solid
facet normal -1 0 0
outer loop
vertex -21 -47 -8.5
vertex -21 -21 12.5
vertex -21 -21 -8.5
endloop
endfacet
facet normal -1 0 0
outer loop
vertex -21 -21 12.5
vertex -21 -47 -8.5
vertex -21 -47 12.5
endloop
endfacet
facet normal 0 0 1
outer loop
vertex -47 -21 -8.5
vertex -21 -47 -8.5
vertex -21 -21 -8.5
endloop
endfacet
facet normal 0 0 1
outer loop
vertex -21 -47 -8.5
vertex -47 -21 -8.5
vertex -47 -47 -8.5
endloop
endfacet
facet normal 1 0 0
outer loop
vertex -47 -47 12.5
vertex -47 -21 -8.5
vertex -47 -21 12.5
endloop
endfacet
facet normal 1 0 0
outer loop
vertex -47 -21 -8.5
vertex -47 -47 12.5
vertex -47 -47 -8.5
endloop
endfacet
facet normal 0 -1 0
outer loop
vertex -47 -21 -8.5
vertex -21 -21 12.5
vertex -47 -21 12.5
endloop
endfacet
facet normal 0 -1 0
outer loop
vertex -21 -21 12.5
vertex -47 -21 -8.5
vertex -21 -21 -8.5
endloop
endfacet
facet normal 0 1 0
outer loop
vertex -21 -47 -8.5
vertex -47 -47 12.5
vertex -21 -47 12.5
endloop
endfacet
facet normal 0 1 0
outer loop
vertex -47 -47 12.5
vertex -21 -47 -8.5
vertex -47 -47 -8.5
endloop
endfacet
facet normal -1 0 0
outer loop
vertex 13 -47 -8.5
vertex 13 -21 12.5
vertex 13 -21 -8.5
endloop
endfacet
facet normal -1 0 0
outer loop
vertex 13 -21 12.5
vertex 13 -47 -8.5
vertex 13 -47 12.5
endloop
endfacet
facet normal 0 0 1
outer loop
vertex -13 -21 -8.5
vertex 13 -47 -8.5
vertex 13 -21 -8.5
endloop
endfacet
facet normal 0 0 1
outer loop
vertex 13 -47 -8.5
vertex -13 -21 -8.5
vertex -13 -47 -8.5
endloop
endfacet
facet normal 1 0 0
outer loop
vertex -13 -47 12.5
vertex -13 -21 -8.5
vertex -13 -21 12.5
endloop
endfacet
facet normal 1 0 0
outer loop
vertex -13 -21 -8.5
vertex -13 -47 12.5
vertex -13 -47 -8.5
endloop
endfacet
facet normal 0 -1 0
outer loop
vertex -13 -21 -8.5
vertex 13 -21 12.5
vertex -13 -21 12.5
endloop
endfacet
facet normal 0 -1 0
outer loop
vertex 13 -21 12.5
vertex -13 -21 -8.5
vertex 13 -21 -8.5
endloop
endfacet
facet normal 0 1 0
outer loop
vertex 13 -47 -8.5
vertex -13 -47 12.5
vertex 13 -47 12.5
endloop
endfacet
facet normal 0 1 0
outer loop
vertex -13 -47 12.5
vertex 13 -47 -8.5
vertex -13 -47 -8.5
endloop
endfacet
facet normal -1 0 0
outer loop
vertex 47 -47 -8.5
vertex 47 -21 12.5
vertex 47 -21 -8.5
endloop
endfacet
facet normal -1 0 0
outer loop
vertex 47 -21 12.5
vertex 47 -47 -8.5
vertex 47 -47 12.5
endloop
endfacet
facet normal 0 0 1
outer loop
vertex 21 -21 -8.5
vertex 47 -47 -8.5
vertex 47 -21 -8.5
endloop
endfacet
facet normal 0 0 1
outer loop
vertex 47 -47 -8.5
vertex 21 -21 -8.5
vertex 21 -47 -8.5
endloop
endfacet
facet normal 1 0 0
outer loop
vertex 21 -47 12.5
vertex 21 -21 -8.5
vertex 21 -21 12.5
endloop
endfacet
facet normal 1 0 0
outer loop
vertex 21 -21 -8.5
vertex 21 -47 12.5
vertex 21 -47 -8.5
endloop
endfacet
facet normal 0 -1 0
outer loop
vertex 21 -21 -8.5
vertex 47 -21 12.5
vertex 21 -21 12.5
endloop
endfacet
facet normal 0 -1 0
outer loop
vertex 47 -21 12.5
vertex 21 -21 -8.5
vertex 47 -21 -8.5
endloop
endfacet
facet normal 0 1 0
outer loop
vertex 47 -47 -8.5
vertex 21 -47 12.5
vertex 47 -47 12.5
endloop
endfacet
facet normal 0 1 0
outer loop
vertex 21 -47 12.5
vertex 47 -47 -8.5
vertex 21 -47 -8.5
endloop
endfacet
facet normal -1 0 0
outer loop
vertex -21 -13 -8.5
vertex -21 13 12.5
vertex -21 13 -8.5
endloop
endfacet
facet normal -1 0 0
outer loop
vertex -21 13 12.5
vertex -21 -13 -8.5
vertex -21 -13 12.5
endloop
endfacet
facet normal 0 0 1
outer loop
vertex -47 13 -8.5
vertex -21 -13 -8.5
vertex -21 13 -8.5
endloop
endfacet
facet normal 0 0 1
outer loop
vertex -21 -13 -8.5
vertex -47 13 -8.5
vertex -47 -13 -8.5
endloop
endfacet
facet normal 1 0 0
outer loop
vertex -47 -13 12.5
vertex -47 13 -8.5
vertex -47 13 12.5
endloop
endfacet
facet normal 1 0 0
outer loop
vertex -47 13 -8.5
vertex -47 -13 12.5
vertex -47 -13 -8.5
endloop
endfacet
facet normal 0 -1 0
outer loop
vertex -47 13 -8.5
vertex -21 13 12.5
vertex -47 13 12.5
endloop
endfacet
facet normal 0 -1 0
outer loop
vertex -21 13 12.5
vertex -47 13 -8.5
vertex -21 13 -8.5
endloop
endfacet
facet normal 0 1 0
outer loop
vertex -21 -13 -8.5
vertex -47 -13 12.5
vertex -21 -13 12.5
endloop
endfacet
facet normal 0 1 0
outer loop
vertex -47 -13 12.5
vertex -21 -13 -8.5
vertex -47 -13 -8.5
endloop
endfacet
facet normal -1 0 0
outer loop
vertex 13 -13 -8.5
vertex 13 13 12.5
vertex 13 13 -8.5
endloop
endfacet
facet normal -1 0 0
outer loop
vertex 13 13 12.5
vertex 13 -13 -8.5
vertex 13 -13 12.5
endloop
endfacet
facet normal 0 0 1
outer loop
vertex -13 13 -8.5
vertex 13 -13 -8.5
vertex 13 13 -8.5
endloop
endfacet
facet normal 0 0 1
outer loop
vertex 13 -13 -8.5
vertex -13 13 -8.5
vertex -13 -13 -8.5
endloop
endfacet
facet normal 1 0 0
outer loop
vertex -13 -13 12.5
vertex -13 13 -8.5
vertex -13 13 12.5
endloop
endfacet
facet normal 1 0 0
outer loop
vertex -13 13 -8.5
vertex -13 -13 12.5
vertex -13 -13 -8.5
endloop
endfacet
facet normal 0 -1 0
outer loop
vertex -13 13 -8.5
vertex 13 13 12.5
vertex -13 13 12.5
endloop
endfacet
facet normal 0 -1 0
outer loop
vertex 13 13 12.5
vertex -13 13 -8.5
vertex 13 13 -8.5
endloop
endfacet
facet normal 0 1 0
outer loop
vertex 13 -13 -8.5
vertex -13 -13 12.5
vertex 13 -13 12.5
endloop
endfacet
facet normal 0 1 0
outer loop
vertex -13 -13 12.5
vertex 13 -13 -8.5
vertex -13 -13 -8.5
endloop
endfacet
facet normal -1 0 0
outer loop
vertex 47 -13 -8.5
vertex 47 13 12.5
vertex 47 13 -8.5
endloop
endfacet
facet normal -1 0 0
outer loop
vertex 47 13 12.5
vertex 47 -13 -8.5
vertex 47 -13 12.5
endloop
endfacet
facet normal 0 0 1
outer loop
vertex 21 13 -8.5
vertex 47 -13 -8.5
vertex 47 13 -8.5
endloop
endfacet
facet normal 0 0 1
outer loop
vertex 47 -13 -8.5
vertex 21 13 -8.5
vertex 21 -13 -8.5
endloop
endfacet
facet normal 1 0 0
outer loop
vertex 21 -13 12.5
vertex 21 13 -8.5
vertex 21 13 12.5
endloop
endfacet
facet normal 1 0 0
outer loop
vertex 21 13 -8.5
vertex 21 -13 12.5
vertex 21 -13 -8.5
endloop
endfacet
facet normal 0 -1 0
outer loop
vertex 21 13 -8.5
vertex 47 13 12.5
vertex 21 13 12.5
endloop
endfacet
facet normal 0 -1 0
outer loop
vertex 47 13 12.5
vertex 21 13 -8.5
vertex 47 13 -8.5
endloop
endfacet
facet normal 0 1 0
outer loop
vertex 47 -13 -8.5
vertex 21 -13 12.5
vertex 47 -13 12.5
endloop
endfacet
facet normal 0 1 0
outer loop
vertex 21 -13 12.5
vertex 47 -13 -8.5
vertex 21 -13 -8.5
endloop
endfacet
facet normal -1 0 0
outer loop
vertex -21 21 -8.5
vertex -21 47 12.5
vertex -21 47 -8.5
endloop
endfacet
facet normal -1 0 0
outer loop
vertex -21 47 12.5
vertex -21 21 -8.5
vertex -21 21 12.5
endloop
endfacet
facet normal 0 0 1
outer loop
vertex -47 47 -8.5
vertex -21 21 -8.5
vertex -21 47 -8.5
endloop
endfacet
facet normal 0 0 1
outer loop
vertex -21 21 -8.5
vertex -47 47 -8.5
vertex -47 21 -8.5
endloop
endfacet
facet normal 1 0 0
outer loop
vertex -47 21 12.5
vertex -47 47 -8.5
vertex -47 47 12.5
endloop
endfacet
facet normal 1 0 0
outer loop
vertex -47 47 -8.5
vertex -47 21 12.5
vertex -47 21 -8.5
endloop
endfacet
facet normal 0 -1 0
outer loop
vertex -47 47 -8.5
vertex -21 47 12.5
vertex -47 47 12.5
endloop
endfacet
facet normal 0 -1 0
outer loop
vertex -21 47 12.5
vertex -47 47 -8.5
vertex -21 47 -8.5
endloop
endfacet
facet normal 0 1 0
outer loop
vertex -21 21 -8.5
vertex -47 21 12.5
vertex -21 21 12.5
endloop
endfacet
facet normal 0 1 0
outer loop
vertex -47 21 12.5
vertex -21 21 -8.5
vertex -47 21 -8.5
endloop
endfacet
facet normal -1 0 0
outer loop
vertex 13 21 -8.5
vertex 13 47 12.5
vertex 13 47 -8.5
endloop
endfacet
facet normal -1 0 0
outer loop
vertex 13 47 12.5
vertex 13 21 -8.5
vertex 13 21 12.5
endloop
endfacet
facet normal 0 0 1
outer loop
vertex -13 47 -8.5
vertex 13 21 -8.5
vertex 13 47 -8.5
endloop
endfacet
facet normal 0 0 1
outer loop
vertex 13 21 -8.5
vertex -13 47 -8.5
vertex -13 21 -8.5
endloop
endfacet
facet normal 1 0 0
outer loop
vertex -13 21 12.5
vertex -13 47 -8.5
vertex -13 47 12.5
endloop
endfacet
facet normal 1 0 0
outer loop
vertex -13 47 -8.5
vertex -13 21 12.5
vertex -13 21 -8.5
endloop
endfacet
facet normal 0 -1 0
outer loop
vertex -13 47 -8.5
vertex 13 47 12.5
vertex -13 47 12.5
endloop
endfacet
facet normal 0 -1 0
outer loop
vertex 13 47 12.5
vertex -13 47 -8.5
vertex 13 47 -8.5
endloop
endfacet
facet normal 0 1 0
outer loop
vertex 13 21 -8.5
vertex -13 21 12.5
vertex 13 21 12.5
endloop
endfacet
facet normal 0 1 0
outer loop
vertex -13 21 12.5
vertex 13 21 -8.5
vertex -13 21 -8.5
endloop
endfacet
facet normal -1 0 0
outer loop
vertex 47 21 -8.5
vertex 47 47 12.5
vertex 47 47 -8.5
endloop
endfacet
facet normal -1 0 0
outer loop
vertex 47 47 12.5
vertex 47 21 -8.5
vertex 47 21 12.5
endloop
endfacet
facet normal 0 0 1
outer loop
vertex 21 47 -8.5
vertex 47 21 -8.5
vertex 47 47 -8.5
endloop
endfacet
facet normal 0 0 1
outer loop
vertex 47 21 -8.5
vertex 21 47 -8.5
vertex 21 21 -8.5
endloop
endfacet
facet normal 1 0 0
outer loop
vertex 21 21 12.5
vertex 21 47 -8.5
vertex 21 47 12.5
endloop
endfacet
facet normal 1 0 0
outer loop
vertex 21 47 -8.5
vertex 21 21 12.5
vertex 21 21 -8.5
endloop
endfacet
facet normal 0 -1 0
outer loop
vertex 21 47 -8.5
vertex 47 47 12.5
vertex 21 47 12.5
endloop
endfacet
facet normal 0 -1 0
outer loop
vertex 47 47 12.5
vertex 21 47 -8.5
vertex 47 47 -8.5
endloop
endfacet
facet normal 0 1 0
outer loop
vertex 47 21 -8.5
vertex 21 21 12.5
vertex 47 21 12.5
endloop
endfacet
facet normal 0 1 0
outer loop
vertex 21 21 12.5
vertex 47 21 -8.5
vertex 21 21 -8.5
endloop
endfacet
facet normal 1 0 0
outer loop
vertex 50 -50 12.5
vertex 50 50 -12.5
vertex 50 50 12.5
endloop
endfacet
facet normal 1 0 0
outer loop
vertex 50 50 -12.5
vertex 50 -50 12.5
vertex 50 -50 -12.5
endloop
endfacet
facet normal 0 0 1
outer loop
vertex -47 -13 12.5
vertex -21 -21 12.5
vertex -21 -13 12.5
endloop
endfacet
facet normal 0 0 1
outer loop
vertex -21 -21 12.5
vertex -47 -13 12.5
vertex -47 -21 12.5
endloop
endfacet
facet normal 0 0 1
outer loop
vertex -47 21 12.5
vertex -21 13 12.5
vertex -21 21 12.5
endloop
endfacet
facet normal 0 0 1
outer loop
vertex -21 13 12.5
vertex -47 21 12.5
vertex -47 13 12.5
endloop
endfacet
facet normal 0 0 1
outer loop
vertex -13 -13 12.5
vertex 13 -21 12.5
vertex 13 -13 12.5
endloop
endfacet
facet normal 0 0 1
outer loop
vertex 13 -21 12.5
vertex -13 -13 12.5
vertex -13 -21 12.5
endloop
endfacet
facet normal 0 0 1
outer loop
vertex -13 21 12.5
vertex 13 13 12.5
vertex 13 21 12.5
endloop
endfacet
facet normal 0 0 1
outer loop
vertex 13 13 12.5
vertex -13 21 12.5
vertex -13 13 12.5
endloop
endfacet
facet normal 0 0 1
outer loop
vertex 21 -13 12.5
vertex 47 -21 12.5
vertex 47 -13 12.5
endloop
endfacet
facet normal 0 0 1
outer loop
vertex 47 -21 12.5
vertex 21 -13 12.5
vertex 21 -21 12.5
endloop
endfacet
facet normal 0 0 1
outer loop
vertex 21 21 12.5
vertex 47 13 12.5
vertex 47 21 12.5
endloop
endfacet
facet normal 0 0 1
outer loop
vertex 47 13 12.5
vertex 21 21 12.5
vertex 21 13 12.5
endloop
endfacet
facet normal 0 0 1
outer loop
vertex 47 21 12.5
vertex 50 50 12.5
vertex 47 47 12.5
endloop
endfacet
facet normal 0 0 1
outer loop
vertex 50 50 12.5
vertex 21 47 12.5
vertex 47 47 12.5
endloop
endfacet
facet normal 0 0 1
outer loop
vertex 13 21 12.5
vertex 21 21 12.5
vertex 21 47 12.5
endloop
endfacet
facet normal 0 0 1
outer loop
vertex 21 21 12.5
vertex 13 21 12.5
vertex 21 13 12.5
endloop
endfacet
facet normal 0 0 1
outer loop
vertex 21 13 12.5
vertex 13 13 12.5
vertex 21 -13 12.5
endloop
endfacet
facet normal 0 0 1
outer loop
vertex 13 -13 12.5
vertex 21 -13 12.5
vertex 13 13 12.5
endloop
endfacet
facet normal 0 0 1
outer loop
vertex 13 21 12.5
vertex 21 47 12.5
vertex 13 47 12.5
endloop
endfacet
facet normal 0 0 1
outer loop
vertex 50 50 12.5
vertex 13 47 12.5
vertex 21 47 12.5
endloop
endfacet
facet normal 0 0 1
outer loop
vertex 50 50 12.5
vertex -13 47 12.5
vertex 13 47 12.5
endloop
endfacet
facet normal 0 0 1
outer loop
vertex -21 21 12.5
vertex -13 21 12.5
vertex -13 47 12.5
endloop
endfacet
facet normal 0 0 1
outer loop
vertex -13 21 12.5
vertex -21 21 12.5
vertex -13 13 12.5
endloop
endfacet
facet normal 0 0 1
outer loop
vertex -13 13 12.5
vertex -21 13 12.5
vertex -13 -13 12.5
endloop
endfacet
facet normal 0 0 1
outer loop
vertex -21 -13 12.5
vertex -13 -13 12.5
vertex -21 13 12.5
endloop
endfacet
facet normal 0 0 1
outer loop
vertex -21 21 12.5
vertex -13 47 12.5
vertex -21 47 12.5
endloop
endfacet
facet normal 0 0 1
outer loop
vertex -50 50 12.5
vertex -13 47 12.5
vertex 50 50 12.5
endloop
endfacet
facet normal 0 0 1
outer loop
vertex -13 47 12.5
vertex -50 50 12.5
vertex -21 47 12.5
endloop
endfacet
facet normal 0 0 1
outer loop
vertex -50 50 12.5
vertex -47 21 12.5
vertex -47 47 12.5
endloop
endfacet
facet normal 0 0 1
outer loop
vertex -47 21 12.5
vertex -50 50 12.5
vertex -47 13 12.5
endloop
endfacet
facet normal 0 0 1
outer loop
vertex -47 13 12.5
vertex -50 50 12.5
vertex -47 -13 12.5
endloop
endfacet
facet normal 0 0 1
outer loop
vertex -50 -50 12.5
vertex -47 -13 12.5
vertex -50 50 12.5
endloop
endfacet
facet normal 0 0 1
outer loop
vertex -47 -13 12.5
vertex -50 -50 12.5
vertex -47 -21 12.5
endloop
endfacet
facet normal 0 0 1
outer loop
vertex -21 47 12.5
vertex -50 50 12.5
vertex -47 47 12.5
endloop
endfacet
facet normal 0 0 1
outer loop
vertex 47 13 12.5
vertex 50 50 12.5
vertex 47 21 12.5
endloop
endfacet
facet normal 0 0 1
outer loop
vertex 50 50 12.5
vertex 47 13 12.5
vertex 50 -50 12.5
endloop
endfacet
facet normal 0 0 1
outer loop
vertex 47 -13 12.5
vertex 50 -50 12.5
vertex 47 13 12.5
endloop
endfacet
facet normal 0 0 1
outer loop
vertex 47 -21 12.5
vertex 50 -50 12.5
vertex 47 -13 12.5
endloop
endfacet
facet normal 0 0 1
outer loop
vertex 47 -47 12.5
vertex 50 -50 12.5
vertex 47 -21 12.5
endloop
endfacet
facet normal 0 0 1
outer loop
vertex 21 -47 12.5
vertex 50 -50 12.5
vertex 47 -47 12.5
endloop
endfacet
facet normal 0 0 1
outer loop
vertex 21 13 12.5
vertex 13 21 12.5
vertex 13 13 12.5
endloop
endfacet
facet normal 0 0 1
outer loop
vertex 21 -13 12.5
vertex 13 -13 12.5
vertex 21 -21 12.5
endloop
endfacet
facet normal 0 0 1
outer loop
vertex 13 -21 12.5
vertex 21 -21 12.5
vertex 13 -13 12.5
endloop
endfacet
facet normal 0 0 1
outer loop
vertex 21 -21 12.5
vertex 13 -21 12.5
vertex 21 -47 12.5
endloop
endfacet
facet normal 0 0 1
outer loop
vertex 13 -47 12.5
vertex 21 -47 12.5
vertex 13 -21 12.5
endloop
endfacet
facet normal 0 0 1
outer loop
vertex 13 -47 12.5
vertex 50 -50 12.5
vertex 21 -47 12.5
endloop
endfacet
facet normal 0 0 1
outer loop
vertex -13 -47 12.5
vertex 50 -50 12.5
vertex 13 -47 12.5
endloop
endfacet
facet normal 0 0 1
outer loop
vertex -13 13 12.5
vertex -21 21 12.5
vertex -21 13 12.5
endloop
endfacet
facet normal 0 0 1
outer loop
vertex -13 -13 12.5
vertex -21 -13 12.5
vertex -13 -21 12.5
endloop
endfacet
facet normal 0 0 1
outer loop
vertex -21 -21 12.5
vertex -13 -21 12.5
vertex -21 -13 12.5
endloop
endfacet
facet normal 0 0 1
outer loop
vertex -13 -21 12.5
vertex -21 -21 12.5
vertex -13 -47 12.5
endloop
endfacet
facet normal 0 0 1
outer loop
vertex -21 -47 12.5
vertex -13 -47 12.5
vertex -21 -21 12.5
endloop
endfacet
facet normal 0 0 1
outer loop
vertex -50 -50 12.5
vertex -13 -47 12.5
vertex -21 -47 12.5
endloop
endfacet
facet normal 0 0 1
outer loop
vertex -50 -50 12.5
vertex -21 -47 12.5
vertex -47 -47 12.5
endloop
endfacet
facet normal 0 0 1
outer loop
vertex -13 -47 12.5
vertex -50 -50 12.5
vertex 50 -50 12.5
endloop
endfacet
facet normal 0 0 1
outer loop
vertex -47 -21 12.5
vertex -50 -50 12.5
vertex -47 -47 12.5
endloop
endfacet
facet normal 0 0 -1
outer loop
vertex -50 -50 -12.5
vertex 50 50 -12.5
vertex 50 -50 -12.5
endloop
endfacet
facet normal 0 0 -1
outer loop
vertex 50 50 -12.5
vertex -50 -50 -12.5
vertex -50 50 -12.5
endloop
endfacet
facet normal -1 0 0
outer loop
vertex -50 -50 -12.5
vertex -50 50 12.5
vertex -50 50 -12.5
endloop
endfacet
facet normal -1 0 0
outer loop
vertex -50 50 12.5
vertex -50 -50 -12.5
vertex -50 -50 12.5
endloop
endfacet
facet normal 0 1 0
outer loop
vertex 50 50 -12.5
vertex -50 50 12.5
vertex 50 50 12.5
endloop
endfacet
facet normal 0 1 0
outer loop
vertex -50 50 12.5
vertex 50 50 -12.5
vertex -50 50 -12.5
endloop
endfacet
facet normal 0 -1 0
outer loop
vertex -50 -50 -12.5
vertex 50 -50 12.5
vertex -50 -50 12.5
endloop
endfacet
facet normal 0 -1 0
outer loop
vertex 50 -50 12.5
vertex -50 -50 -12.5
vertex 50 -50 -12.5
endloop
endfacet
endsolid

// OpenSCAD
$fn = 32;

// ----------------------------------------------------------------------
// Pocket plate 100 x 100 x 25
// 3 x 3 pockets 26 mm square, 21 mm deep
// ----------------------------------------------------------------------

// --- parameters (mm) ---
thickness = 25;  // plate thickness
floor_t = 4;     // material left under each pocket
pocket = 26;     // pocket side length
pitch_x = 34;    // pocket pitch along X
pitch_y = 34;    // pocket pitch along Y
cols = 3;        // pockets per row
rows = 3;        // rows of pockets

// --- derived feature positions (mm) ---
depth = thickness - floor_t;        // = 21   pocket depth, down to the floor
span_x = (cols - 1) * pitch_x;      // = 68   distance between outer pockets
span_y = (rows - 1) * pitch_y;      // = 68   distance between outer pocket rows
origin_x = -span_x / 2;             // = -34   X of the first pocket
origin_y = -span_y / 2;             // = -34   Y of the first pocket
plate = [span_x + pocket + 6, span_y + pocket + 6, thickness];  // = [100, 100, 25]   overall size: pockets plus 3 mm of wall on each side
feature_centers = [
  [origin_x + 0 * pitch_x, origin_y + 0 * pitch_y],
  [origin_x + 1 * pitch_x, origin_y + 0 * pitch_y],
  [origin_x + 2 * pitch_x, origin_y + 0 * pitch_y],
  [origin_x + 0 * pitch_x, origin_y + 1 * pitch_y],
  [origin_x + 1 * pitch_x, origin_y + 1 * pitch_y],
  [origin_x + 2 * pitch_x, origin_y + 1 * pitch_y],
  [origin_x + 0 * pitch_x, origin_y + 2 * pitch_y],
  [origin_x + 1 * pitch_x, origin_y + 2 * pitch_y],
  [origin_x + 2 * pitch_x, origin_y + 2 * pitch_y]
];   // pocket centres, used verbatim by the cutter loop

// plate outline, then one pocket per centre in feature_centers
difference() {
  cube(plate, center = true);
  for (centre = feature_centers)
    translate([centre[0] - pocket / 2, centre[1] - pocket / 2, plate[2] / 2 - depth])
      cube([pocket, pocket, depth + 1]);  // centred on the declared pocket centre
}
